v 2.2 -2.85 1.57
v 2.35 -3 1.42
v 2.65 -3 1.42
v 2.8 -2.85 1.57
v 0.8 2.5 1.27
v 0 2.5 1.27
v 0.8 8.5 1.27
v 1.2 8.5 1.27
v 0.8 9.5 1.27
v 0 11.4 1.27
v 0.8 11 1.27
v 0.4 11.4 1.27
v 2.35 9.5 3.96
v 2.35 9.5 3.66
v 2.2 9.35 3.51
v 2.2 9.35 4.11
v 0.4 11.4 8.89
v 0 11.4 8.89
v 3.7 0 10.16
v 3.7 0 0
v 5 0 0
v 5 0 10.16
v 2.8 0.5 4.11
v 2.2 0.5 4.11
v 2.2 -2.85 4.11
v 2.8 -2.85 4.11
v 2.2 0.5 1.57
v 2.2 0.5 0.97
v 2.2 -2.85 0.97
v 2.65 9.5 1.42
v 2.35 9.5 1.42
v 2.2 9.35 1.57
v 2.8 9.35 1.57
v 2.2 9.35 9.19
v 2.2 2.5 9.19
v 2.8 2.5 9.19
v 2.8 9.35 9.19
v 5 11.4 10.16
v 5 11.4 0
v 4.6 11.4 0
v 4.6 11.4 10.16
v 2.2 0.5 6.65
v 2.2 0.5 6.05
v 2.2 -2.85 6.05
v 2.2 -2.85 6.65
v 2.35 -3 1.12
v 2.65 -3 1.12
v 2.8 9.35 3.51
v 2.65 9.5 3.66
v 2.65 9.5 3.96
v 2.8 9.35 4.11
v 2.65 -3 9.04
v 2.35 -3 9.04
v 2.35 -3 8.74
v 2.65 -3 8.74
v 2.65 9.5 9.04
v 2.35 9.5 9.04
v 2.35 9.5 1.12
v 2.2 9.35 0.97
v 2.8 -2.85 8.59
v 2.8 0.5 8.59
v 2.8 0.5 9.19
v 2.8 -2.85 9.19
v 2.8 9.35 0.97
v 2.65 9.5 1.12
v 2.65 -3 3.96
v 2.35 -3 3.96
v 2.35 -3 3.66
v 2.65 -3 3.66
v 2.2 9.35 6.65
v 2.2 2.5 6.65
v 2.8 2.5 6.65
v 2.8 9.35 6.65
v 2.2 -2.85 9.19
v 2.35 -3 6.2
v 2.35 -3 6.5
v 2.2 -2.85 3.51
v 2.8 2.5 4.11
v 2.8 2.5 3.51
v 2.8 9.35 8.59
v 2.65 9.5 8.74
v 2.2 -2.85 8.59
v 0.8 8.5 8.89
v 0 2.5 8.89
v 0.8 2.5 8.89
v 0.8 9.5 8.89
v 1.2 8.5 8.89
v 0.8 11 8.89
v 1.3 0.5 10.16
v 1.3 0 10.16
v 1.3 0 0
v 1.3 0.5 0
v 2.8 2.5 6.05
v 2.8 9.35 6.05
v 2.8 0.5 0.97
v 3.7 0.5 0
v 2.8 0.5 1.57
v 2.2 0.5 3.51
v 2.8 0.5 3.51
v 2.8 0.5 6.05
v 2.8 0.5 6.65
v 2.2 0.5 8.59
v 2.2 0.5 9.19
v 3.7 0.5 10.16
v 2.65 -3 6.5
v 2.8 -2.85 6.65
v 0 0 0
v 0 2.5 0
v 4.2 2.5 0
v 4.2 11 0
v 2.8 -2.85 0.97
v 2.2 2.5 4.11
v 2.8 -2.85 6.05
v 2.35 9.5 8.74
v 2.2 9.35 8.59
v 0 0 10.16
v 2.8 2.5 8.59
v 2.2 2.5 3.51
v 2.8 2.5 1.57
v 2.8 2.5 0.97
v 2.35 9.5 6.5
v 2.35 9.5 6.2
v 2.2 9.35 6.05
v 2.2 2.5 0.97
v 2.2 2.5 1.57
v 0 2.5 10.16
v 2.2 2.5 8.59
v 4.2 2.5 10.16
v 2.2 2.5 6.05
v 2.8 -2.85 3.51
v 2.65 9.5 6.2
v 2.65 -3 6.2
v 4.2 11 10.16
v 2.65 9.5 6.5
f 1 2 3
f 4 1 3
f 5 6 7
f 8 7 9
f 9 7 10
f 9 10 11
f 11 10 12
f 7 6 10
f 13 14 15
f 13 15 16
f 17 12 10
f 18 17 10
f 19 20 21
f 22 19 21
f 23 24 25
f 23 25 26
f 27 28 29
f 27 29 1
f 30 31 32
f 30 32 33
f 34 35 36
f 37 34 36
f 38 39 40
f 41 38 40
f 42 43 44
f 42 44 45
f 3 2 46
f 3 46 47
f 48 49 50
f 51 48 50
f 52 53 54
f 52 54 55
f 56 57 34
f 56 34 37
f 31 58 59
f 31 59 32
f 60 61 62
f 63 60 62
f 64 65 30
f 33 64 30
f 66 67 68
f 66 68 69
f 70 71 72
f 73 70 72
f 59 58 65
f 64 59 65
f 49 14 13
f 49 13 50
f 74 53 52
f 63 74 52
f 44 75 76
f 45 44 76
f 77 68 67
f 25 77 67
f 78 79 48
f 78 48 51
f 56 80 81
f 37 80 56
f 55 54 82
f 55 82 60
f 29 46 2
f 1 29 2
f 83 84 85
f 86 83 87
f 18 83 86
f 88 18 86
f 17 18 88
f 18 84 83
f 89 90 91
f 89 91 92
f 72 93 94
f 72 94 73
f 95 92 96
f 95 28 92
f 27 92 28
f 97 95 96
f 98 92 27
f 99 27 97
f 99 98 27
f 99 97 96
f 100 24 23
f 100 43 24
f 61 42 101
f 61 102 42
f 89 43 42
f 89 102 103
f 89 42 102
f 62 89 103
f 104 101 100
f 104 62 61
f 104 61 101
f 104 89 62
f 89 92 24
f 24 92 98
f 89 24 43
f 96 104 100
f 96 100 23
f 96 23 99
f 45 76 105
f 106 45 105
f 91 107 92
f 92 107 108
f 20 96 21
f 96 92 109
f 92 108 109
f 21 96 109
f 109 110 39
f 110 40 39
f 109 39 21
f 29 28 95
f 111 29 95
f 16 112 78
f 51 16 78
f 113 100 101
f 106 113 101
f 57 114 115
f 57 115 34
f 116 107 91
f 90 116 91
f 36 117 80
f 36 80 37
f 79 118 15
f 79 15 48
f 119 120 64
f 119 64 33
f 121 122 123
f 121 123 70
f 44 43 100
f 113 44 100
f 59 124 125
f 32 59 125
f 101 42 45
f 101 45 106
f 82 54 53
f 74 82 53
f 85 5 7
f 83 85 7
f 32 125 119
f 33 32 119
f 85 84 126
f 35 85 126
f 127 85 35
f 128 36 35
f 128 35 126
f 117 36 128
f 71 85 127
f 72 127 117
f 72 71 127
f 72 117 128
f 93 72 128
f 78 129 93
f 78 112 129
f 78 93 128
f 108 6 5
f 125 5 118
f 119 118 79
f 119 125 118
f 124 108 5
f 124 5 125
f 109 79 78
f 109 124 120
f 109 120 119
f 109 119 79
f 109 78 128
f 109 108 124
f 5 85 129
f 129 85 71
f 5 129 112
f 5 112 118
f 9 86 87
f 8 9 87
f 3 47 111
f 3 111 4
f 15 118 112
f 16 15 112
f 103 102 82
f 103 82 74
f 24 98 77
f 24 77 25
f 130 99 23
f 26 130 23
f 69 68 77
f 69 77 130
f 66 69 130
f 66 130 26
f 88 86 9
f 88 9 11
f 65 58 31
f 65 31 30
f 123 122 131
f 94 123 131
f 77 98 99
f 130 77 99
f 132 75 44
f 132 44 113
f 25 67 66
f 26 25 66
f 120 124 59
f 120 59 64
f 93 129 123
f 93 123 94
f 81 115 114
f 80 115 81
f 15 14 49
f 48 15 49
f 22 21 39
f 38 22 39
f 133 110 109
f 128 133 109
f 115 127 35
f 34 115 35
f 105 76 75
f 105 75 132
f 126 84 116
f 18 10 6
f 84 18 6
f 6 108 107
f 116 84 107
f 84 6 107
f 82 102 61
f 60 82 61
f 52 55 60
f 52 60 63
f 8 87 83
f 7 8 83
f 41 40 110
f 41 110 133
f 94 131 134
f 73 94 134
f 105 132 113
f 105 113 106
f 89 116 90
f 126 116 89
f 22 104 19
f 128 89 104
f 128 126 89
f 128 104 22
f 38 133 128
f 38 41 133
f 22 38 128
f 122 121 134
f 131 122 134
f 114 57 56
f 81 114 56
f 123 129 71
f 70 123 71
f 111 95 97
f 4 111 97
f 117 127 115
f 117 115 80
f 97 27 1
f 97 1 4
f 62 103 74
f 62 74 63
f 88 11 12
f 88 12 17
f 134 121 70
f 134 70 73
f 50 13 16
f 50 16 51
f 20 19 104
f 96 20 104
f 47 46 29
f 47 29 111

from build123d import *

# Parameters (mm, degrees)
BOSS_EXTRU_1_DEPTH      = 10.16
ESQUISSE3_W             = 0.8
ESQUISSE3_H             = 1.27
ENL_V_MAT_EXTRU_1_DEPTH = 8.9
ESQUISSE4_W             = 2.4
ESQUISSE4_H             = 0.5
ENL_V_MAT_EXTRU_2_DEPTH = 11.16
ESQUISSE2_W             = 0.6
ESQUISSE2_H             = 0.6
BOSS_EXTRU_2_DEPTH      = 3.5
BOSS_EXTRU_2_DEPTH_BACK = 9
BOSS_EXTRU_3_DEPTH      = 7.62
CHANFREIN4_SIZE         = 0.15
CHANFREIN5_SIZE         = 0.4


with BuildPart() as part:
    # Esquisse1 → Boss.-Extru.1 (new body)
    with BuildSketch(Plane.XY):
        Polygon((0, 11.4), (0, 0), (5, 0), (5, 11.4), (4.2, 11.4), (4.2, 2.5), (0.8, 2.5), (0.8, 11.4), align=None)
    extrude(amount=BOSS_EXTRU_1_DEPTH)

    # Esquisse3 → Enlèv. mat.-Extru.1 (cut)
    with BuildSketch(Plane(origin=(0, 11.4, 0), x_dir=(1, 0, 0), z_dir=(0, 1, 0))):
        with Locations((0.4, -0.635)):
            Rectangle(ESQUISSE3_W, ESQUISSE3_H)
        with Locations((0.4, -9.525)):
            Rectangle(ESQUISSE3_W, ESQUISSE3_H)
    extrude(amount=-ENL_V_MAT_EXTRU_1_DEPTH, mode=Mode.SUBTRACT)

    # Esquisse4 → Enlèv. mat.-Extru.2 (cut, through all)
    with BuildSketch(Plane.XY.offset(10.16)):
        with Locations((2.5, 0.25)):
            Rectangle(ESQUISSE4_W, ESQUISSE4_H)
    extrude(amount=-ENL_V_MAT_EXTRU_2_DEPTH, mode=Mode.SUBTRACT)

    # Esquisse2 → Boss.-Extru.2 (add, two sides)
    with BuildSketch(Plane.XZ.offset(-0.5)) as boss_extru_2_sk:
        with Locations((2.5, 8.89)):
            Rectangle(ESQUISSE2_W, ESQUISSE2_H)
        with Locations((2.5, 1.27)):
            Rectangle(ESQUISSE2_W, ESQUISSE2_H)
        with Locations((2.5, 6.35)):
            Rectangle(ESQUISSE2_W, ESQUISSE2_H)
        with Locations((2.5, 3.81)):
            Rectangle(ESQUISSE2_W, ESQUISSE2_H)
    extrude(amount=BOSS_EXTRU_2_DEPTH)
    extrude(boss_extru_2_sk.sketch, amount=-BOSS_EXTRU_2_DEPTH_BACK)

    # Esquisse5 → Boss.-Extru.3 (add)
    with BuildSketch(Plane.XY.offset(8.89)):
        Polygon((0.8, 9.5), (1.2, 8.5), (0.8, 8.5), align=None)
    extrude(amount=-BOSS_EXTRU_3_DEPTH)

    # Chanfrein4
    chanfrein4_edges = [part.edges().sort_by_distance(p)[0] for p in [
        (2.8, 9.5, 6.35),
        (2.5, 9.5, 6.05),
        (2.2, 9.5, 6.35),
        (2.5, 9.5, 6.65),
        (2.8, -3, 6.35),
        (2.5, -3, 6.65),
        (2.2, -3, 6.35),
        (2.5, -3, 6.05),
        (2.8, 9.5, 3.81),
        (2.5, 9.5, 3.51),
        (2.2, 9.5, 3.81),
        (2.5, 9.5, 4.11),
        (2.8, -3, 3.81),
        (2.5, -3, 4.11),
        (2.2, -3, 3.81),
        (2.5, -3, 3.51),
        (2.8, 9.5, 8.89),
        (2.5, 9.5, 8.59),
        (2.2, 9.5, 8.89),
        (2.5, 9.5, 9.19),
        (2.8, -3, 8.89),
        (2.5, -3, 9.19),
        (2.2, -3, 8.89),
        (2.5, -3, 8.59),
        (2.8, 9.5, 1.27),
        (2.5, 9.5, 0.97),
        (2.2, 9.5, 1.27),
        (2.5, 9.5, 1.57),
        (2.8, -3, 1.27),
        (2.5, -3, 1.57),
        (2.2, -3, 1.27),
        (2.5, -3, 0.97),
    ]]
    chamfer(chanfrein4_edges, length=CHANFREIN4_SIZE)

    # Chanfrein5
    chanfrein5_edges = [part.edges().sort_by_distance(p)[0] for p in [
        (4.2, 11.4, 5.08),
        (0.8, 11.4, 5.08),
    ]]
    chamfer(chanfrein5_edges, length=CHANFREIN5_SIZE)


solid = part.part
